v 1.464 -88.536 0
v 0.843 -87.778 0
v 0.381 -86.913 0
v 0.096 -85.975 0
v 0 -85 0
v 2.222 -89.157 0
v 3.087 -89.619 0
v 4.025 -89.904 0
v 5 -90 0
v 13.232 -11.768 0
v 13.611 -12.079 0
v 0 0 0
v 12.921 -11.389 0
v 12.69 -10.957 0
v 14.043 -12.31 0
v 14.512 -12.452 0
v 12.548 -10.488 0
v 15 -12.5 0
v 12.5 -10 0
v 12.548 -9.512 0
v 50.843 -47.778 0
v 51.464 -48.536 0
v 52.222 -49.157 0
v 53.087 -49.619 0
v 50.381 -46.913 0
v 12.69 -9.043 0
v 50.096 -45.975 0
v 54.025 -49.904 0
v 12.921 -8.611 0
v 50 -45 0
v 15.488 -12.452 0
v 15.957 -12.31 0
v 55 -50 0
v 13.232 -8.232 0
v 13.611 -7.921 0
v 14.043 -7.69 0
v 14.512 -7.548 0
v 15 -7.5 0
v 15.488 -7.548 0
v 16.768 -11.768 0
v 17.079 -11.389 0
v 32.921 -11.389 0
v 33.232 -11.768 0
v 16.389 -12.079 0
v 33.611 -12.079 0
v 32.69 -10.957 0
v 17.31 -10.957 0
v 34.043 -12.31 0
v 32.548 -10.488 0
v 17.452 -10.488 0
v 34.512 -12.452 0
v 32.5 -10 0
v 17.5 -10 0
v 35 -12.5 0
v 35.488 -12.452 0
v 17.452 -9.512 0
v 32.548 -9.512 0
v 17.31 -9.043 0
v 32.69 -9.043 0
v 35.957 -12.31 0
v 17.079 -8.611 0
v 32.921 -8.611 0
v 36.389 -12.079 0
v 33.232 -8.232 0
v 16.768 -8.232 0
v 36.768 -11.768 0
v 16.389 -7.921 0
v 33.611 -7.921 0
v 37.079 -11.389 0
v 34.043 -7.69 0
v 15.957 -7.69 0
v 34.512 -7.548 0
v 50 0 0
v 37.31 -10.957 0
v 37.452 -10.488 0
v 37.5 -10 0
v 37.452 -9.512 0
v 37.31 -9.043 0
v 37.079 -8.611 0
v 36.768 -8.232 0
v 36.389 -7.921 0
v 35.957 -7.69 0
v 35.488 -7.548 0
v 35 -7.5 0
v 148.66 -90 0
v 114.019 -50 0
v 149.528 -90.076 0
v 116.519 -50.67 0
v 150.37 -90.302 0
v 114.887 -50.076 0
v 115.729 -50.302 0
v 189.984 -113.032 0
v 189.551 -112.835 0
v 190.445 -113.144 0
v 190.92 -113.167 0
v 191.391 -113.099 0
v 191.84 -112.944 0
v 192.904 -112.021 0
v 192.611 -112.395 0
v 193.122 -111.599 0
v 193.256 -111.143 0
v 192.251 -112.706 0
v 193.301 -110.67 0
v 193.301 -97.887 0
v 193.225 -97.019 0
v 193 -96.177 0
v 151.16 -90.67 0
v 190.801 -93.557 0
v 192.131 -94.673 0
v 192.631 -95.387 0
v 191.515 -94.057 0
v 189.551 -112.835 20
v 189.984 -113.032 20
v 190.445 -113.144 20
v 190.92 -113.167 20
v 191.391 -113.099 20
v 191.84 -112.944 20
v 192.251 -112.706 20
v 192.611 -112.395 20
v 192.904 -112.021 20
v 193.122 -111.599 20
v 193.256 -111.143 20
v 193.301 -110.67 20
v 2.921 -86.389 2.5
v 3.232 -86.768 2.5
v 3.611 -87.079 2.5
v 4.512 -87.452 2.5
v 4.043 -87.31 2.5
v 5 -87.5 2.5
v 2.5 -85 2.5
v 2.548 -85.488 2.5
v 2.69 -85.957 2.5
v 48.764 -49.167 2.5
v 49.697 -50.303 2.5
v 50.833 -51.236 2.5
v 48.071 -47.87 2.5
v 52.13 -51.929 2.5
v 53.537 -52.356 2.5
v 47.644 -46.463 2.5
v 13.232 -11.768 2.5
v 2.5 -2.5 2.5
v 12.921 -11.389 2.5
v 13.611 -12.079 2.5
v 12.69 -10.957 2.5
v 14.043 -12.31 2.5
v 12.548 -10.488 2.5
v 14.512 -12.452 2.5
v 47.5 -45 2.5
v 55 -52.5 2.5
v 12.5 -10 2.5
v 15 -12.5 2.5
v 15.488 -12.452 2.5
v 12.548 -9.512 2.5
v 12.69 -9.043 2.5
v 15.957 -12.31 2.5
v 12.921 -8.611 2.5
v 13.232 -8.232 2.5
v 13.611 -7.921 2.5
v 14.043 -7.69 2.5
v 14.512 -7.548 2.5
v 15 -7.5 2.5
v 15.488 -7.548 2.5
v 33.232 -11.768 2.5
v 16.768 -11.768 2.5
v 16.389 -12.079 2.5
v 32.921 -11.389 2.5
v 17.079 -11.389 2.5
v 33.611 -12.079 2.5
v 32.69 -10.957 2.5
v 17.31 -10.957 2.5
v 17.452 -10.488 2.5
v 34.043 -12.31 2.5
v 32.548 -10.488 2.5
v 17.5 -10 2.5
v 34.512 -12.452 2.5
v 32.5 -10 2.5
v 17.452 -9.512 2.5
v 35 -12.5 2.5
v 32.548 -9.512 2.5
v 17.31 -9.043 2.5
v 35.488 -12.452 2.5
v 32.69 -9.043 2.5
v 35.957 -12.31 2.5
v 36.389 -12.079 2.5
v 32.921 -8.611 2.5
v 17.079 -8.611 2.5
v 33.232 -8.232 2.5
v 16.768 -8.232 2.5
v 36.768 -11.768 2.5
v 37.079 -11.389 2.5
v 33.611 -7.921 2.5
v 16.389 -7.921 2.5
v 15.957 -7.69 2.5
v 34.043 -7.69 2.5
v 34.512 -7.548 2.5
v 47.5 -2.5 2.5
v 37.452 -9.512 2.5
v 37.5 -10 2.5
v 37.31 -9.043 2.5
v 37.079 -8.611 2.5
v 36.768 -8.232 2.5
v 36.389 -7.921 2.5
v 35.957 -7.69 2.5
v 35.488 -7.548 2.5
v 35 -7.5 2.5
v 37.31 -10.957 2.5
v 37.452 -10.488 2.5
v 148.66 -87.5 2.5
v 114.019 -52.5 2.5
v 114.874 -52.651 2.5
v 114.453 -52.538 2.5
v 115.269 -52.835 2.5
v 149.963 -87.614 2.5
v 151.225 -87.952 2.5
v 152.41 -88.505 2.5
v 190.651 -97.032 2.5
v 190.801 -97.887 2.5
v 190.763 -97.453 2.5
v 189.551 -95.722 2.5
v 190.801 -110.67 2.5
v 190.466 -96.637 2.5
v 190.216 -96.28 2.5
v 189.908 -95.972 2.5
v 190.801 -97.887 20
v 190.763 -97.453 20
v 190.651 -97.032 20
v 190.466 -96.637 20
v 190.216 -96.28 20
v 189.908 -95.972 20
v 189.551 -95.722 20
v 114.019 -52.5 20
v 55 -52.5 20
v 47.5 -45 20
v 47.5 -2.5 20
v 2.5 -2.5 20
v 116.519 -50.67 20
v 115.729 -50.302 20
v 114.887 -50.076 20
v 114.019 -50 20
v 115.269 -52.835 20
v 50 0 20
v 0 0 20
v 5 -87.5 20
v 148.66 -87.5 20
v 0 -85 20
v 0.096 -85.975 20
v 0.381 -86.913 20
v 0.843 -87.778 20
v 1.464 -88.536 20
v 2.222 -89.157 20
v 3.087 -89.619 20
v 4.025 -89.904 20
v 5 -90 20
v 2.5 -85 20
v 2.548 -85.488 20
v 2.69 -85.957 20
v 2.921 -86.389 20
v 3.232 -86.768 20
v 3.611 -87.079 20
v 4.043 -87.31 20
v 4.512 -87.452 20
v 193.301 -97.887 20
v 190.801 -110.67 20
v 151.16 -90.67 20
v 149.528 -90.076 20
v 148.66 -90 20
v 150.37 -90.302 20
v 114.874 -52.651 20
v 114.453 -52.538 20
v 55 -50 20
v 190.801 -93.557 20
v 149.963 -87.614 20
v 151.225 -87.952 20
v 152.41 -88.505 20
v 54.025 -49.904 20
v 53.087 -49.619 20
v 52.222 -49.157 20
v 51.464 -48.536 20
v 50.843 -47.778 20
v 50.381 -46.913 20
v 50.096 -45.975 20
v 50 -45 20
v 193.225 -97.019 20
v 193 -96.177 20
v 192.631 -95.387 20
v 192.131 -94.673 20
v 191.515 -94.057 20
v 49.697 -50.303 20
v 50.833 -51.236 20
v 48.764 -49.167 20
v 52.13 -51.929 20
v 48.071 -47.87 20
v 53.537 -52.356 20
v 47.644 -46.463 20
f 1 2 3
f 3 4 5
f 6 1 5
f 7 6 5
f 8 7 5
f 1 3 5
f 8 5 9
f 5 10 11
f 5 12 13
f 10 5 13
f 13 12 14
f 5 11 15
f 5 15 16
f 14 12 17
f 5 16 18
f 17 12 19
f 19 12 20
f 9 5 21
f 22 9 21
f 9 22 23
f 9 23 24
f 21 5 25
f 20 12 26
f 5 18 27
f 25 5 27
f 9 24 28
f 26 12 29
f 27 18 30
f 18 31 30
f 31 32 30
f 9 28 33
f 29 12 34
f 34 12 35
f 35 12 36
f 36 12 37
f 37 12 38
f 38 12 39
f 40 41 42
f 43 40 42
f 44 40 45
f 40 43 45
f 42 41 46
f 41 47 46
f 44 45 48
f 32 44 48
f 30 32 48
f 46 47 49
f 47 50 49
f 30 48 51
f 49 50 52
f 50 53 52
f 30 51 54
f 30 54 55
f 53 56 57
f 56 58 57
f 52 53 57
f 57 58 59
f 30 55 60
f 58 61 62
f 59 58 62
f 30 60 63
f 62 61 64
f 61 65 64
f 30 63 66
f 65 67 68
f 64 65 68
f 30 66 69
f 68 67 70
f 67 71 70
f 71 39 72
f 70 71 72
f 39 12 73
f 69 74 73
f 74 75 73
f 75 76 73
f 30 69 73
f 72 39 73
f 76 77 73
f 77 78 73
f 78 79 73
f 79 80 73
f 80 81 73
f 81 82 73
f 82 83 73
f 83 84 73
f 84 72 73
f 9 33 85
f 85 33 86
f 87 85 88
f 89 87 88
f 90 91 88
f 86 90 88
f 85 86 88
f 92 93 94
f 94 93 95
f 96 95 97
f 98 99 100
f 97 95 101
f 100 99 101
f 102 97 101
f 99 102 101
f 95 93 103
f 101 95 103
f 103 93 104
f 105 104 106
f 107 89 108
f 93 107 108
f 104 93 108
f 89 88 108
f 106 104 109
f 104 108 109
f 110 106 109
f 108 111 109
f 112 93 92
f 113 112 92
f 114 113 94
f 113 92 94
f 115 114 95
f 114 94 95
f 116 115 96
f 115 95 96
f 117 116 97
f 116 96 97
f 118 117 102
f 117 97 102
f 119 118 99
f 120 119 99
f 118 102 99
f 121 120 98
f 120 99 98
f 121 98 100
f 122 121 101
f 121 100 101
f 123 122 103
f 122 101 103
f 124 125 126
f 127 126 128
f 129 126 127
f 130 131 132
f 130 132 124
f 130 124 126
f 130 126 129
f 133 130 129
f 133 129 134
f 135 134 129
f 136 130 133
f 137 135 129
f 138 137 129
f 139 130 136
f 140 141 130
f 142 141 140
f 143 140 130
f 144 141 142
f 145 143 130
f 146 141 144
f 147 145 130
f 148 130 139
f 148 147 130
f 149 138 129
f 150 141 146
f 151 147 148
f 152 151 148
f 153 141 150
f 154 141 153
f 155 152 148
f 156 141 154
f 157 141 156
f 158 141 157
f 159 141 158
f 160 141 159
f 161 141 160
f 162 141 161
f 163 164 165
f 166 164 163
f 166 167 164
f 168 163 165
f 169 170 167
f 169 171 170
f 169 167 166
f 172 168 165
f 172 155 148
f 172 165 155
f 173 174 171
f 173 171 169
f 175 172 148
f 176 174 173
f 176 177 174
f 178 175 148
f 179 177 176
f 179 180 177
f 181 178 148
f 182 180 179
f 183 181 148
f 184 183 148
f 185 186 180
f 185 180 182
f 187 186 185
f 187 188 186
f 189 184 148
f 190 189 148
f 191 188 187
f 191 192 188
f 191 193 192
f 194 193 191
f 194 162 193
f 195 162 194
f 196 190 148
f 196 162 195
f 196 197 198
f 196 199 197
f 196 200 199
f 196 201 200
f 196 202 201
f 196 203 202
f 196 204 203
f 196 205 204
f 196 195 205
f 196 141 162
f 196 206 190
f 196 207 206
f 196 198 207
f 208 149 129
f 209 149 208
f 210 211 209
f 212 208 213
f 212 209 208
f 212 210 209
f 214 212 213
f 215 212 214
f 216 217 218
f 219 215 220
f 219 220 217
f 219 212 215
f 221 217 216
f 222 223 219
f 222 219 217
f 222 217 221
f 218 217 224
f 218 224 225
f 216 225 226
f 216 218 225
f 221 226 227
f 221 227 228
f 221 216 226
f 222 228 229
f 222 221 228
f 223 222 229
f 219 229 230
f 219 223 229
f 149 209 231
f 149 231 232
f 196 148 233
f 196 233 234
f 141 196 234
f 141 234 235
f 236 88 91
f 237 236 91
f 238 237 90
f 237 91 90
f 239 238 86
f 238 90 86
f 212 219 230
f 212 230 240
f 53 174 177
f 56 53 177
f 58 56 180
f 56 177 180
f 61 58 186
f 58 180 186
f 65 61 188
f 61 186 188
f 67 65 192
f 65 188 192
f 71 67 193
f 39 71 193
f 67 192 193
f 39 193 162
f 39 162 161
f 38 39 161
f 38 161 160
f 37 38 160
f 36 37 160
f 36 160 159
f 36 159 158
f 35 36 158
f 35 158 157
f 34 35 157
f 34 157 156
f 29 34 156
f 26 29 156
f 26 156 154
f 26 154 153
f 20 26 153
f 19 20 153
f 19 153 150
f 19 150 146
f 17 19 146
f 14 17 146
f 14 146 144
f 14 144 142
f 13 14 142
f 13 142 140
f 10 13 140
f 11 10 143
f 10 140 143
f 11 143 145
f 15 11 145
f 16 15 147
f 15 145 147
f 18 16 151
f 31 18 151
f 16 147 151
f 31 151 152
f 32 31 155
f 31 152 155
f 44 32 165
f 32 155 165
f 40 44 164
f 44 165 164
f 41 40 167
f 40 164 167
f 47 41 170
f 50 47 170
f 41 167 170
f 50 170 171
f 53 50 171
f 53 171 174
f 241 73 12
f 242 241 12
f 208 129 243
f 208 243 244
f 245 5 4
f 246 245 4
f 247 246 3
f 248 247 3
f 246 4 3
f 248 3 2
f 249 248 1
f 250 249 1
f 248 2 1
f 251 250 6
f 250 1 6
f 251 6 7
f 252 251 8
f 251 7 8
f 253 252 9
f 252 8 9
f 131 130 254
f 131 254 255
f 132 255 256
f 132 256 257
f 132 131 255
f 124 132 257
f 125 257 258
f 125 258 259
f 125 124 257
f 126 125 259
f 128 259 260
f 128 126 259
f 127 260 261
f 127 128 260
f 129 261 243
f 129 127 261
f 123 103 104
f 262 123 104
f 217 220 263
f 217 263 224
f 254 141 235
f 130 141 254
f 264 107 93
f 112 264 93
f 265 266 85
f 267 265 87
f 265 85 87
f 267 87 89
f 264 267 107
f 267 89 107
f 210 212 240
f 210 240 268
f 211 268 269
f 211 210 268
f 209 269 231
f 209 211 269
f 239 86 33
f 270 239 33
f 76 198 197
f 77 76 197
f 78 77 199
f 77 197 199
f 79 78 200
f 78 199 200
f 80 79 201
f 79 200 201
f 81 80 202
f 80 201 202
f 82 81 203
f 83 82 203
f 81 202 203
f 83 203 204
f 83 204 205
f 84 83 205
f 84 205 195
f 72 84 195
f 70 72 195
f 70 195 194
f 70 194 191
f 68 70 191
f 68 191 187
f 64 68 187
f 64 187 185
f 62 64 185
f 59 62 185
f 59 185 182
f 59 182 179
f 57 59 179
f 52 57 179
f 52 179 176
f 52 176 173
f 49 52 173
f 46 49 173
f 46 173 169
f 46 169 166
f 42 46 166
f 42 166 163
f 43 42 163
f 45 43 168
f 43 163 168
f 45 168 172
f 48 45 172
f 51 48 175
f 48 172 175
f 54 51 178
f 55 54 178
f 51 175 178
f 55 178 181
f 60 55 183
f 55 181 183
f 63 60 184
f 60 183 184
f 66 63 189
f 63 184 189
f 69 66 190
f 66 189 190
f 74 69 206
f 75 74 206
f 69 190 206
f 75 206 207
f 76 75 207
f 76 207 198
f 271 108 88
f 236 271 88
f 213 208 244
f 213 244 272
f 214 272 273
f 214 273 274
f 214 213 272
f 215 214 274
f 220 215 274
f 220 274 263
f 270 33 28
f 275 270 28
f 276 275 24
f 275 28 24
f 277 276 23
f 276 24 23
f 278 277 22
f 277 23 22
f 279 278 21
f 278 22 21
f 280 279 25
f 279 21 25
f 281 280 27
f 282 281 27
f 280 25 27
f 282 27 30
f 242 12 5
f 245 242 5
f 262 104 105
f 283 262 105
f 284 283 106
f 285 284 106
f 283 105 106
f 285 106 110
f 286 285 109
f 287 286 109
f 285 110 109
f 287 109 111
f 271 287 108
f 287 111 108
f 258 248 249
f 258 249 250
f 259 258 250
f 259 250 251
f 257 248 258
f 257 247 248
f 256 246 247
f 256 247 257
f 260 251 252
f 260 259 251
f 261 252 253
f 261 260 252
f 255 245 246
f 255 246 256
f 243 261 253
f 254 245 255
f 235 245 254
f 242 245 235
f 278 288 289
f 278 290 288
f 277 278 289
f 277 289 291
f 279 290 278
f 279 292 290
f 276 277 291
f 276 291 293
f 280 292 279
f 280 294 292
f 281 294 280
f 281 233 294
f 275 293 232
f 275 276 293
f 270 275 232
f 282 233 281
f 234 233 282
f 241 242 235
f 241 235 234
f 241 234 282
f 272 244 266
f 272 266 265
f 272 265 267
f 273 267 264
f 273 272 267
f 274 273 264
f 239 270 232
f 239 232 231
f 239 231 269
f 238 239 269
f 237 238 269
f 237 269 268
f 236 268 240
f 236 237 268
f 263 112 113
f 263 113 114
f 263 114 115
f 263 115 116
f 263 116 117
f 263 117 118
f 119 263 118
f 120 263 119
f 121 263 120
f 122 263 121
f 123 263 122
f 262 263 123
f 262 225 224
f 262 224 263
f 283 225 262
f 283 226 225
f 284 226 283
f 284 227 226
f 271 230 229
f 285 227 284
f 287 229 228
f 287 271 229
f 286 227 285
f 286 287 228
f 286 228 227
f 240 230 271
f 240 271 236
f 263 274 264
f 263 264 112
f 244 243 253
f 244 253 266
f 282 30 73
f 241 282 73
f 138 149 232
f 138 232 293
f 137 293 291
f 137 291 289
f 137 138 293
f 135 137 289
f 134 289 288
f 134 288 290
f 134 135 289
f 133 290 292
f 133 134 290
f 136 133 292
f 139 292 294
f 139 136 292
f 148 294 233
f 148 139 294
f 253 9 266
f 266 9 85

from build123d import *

# Parameters (mm, degrees)
EXTRUDE1_DEPTH = 20
SHELL1_START   = 2.5
SHELL1_DEPTH   = 17.5
SKETCH2_R      = 2.5
EXTRUDE2_DEPTH = 225.675435256


# Read off the part's stored shape, not the designer's step: Shell1
with BuildPart() as part:
    # Sketch1 → Extrude1 (new body)
    with BuildSketch(Plane.XY):
        with BuildLine():
            Line((0, 0), (0, -85))
            ThreePointArc((0, -85), (1.464466094, -88.535533906), (5, -90))
            Line((5, -90), (148.660254038, -90))
            ThreePointArc((148.660254038, -90), (149.954349263, -90.170370869), (151.160254038, -90.669872981))
            Line((151.160254038, -90.669872981), (189.551270189, -112.834936491))
            ThreePointArc((189.551270189, -112.834936491), (192.051270189, -112.834936491), (193.301270189, -110.669872981))
            Line((193.301270189, -110.669872981), (193.301270189, -97.886751346))
            ThreePointArc((193.301270189, -97.886751346), (192.631397208, -95.386751346), (190.801270189, -93.556624327))
            Line((190.801270189, -93.556624327), (116.519237886, -50.669872981))
            ThreePointArc((116.519237886, -50.669872981), (115.313333112, -50.170370869), (114.019237886, -50))
            Line((114.019237886, -50), (55, -50))
            ThreePointArc((55, -50), (51.464466094, -48.535533906), (50, -45))
            Line((50, -45), (50, 0))
            Line((50, 0), (0, 0))
        make_face()
    extrude(amount=EXTRUDE1_DEPTH)

    # Shell1 outline → Shell1 (cut)
    with BuildSketch(Plane.XY.offset(SHELL1_START)):
        with BuildLine():
            Line((2.5, -2.5), (2.5, -85))
            ThreePointArc((2.5, -85), (3.232233047, -86.767766953), (5, -87.5))
            Line((5, -87.5), (148.660254038, -87.5))
            ThreePointArc((148.660254038, -87.5), (150.601396876, -87.755556303), (152.410254038, -88.504809472))
            Line((152.410254038, -88.504809472), (190.801270189, -110.669872981))
            Line((190.801270189, -110.669872981), (190.801270189, -97.886751346))
            ThreePointArc((190.801270189, -97.886751346), (190.466333699, -96.636751346), (189.551270189, -95.721687836))
            Line((189.551270189, -95.721687836), (115.269237886, -52.834936491))
            ThreePointArc((115.269237886, -52.834936491), (114.666285499, -52.585185434), (114.019237886, -52.5))
            Line((114.019237886, -52.5), (55, -52.5))
            ThreePointArc((55, -52.5), (49.696699141, -50.303300859), (47.5, -45))
            Line((47.5, -45), (47.5, -2.5))
            Line((47.5, -2.5), (2.5, -2.5))
        make_face()
    extrude(amount=SHELL1_DEPTH, mode=Mode.SUBTRACT)

    # Sketch2 → Extrude2 (cut, through all)
    with BuildSketch(Plane.XY.offset(2.5)):
        with Locations((15, -10)):
            Circle(SKETCH2_R)
        with Locations((35, -10)):
            Circle(SKETCH2_R)
    extrude(amount=-EXTRUDE2_DEPTH, mode=Mode.SUBTRACT)


solid = part.part
